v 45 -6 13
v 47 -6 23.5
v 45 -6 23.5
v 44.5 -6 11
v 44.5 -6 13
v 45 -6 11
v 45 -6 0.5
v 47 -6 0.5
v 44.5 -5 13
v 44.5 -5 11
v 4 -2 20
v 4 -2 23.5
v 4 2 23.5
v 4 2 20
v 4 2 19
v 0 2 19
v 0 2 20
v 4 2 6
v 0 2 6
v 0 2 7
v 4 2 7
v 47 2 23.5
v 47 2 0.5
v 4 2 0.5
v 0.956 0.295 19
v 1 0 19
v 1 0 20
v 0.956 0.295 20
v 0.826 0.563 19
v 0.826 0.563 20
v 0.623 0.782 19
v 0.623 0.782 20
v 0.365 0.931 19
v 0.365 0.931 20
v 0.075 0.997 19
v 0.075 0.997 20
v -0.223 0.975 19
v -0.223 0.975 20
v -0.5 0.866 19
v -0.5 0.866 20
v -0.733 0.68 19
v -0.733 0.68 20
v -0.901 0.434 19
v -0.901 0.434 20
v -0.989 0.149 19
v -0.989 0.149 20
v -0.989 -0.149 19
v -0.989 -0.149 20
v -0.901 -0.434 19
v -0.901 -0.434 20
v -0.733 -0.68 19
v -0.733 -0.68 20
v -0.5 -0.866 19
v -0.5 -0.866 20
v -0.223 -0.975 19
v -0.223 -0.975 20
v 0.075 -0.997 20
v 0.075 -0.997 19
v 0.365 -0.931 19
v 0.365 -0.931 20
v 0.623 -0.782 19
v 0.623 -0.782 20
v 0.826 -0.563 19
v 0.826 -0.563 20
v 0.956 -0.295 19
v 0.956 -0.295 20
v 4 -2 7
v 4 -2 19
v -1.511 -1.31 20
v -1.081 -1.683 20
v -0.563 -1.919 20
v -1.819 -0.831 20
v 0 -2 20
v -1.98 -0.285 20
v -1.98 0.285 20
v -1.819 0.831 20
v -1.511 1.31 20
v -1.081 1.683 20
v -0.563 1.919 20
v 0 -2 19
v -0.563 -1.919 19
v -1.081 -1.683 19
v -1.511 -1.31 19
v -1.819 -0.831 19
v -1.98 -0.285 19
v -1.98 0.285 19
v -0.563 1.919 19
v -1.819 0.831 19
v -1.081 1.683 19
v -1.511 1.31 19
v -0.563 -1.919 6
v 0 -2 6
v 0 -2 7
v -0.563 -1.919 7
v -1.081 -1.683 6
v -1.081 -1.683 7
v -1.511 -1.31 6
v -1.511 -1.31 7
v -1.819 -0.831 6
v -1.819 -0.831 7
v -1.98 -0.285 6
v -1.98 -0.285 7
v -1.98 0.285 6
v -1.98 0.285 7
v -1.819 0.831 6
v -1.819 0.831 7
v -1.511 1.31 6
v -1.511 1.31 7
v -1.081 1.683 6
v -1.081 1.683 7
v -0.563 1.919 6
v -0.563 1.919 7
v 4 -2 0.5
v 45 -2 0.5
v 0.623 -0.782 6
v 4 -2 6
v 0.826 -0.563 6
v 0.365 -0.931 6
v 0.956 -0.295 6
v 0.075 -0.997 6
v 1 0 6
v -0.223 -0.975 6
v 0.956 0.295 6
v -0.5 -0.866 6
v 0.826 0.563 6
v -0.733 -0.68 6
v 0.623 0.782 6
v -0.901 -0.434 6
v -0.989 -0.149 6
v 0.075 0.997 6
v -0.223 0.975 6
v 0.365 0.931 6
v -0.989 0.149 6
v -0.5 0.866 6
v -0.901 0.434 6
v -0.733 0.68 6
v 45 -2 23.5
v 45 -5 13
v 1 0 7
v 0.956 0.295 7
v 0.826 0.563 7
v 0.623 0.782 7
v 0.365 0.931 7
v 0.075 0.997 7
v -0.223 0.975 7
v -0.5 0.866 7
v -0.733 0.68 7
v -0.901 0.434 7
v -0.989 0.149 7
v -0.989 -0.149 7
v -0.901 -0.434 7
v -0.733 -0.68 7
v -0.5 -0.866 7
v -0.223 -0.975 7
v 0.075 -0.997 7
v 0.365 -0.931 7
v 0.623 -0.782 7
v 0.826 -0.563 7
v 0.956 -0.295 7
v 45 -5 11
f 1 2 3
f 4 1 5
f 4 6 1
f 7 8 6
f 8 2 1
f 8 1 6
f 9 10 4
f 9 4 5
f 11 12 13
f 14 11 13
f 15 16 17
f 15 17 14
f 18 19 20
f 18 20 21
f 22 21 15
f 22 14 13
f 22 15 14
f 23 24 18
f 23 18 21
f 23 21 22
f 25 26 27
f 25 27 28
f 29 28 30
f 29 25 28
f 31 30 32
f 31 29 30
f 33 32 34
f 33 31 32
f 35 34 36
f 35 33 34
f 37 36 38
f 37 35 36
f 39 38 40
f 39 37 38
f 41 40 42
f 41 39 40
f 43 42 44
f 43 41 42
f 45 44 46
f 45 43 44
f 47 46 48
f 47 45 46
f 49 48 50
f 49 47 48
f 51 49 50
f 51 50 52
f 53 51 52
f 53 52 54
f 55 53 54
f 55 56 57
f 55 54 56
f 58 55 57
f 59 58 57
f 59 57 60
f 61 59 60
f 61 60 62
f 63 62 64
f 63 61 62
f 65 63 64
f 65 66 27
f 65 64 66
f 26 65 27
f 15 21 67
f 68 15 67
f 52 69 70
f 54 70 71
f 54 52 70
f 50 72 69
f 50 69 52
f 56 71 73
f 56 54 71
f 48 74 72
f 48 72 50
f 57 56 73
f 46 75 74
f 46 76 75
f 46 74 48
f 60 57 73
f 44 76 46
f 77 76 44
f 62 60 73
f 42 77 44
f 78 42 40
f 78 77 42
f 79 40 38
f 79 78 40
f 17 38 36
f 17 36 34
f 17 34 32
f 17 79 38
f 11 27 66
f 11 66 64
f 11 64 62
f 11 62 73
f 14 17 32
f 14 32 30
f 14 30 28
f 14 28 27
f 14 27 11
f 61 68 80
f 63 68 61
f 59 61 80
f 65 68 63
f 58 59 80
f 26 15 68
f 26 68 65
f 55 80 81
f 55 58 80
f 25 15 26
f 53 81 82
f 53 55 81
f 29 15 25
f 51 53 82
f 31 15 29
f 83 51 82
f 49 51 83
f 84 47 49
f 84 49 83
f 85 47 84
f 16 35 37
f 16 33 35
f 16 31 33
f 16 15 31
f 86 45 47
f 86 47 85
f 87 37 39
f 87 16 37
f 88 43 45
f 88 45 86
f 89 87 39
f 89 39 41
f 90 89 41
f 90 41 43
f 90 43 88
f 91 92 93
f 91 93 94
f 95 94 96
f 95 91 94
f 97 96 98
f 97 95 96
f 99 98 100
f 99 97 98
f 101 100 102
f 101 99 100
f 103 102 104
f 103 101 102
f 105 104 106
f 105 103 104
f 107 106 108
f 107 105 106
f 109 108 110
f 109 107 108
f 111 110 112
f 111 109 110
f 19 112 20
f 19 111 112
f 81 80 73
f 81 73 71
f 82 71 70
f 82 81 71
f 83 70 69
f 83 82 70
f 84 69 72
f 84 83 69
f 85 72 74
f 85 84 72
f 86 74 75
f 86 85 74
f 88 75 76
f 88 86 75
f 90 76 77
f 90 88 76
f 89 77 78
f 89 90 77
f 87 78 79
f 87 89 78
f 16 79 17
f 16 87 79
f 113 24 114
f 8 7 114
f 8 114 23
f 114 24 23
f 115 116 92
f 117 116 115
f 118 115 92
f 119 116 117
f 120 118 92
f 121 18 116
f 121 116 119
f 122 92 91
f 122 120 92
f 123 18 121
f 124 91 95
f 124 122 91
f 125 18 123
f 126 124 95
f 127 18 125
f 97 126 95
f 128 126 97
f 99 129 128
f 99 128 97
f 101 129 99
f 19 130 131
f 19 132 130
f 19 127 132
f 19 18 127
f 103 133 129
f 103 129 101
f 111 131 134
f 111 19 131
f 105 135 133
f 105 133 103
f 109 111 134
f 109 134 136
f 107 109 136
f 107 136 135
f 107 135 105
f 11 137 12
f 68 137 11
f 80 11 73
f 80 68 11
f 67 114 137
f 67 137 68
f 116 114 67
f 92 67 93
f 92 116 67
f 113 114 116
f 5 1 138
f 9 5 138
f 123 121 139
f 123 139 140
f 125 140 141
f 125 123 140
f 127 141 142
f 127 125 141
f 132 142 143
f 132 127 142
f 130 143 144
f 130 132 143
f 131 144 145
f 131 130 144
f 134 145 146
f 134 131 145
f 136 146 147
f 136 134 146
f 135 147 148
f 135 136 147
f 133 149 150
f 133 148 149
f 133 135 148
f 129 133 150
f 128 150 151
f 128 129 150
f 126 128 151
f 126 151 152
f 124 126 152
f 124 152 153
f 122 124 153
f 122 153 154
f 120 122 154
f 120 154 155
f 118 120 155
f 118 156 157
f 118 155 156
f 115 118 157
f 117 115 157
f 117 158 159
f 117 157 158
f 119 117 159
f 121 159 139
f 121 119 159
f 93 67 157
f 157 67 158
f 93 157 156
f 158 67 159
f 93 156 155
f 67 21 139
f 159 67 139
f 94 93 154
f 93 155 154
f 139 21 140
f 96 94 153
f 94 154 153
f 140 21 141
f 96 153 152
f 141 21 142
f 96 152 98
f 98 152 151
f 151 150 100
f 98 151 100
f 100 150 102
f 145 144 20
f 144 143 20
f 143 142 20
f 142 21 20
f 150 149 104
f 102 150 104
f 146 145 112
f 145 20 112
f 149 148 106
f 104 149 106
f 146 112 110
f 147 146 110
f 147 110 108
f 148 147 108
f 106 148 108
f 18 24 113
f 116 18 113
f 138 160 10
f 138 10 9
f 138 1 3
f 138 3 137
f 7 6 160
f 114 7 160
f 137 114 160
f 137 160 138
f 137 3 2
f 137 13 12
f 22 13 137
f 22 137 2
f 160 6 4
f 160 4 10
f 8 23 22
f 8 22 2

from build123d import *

# Parameters (mm, degrees)
SKETCH_1_R           = 1
EXTRUDE_1_DEPTH      = 24
SKETCH_2_W           = 8
SKETCH_2_H           = 4
CUT_EXTRUDE_2_DEPTH  = 4
CUT_EXTRUDE_3_DEPTH  = 6
CUT_EXTRUDE_START    = -7
CUT_EXTRUDE_4_DEPTH  = 12
SKETCH_4_W           = 2
SKETCH_4_H           = 1
EXTRUDE_2_DEPTH      = 0.5
CUT_EXTRUDE_21_DEPTH = 0.5
CUT_EXTRUDE_22_DEPTH = 0.5


with BuildPart() as part:
    # 草图1 → 凸台-拉伸1 (new body)
    with BuildSketch(Plane.XY):
        with BuildLine():
            Line((0, 2), (47, 2))
            Line((47, 2), (47, -6))
            Line((47, -6), (45, -6))
            Line((45, -6), (45, -2))
            Line((45, -2), (0, -2))
            ThreePointArc((0, -2), (-2, 0), (0, 2))
        make_face()
        Circle(SKETCH_1_R, mode=Mode.SUBTRACT)
    extrude(amount=EXTRUDE_1_DEPTH)

    # 草图2 → 切除-拉伸2 (cut)
    with BuildSketch(Plane.XY.offset(24)):
        Rectangle(SKETCH_2_W, SKETCH_2_H)
    extrude(amount=-CUT_EXTRUDE_2_DEPTH, mode=Mode.SUBTRACT)

    # 草图3 → 切除-拉伸3 (cut)
    with BuildSketch(Plane(origin=(0, 0, 0), x_dir=(-1, 0, 0), z_dir=(0, 0, -1))):
        with BuildLine():
            Line((0, 2), (-4, 2))
            Line((-4, 2), (-4, -2))
            Line((-4, -2), (0, -2))
            ThreePointArc((0, -2), (2, 0), (0, 2))
        make_face()
    extrude(amount=-CUT_EXTRUDE_3_DEPTH, mode=Mode.SUBTRACT)

    # 草图3<2> → 切除-拉伸4 (cut)
    with BuildSketch(Plane(origin=(0, 0, 0), x_dir=(-1, 0, 0), z_dir=(0, 0, -1)).offset(CUT_EXTRUDE_START)):
        with BuildLine():
            ThreePointArc((0, -2), (2, 0), (0, 2))
            Line((0, 2), (-4, 2))
            Line((-4, 2), (-4, -2))
            Line((-4, -2), (0, -2))
        make_face()
    extrude(amount=-CUT_EXTRUDE_4_DEPTH, mode=Mode.SUBTRACT)

    # 草图4 → 凸台-拉伸2 (add)
    with BuildSketch(Plane.ZY.offset(-45)):
        with Locations((12, -5.5)):
            Rectangle(SKETCH_4_W, SKETCH_4_H)
    extrude(amount=EXTRUDE_2_DEPTH)

    # 草图5 → 切除-拉伸21 (cut)
    with BuildSketch(Plane.XY):
        Polygon((4, 2), (4, -2), (45, -2), (45, -6), (47, -6), (47, 2), align=None)
    extrude(amount=CUT_EXTRUDE_21_DEPTH, mode=Mode.SUBTRACT)

    # 草图6 → 切除-拉伸22 (cut)
    with BuildSketch(Plane.XY.offset(24)):
        Polygon((4, -2), (45, -2), (45, -6), (47, -6), (47, 2), (4, 2), align=None)
    extrude(amount=-CUT_EXTRUDE_22_DEPTH, mode=Mode.SUBTRACT)


solid = part.part
